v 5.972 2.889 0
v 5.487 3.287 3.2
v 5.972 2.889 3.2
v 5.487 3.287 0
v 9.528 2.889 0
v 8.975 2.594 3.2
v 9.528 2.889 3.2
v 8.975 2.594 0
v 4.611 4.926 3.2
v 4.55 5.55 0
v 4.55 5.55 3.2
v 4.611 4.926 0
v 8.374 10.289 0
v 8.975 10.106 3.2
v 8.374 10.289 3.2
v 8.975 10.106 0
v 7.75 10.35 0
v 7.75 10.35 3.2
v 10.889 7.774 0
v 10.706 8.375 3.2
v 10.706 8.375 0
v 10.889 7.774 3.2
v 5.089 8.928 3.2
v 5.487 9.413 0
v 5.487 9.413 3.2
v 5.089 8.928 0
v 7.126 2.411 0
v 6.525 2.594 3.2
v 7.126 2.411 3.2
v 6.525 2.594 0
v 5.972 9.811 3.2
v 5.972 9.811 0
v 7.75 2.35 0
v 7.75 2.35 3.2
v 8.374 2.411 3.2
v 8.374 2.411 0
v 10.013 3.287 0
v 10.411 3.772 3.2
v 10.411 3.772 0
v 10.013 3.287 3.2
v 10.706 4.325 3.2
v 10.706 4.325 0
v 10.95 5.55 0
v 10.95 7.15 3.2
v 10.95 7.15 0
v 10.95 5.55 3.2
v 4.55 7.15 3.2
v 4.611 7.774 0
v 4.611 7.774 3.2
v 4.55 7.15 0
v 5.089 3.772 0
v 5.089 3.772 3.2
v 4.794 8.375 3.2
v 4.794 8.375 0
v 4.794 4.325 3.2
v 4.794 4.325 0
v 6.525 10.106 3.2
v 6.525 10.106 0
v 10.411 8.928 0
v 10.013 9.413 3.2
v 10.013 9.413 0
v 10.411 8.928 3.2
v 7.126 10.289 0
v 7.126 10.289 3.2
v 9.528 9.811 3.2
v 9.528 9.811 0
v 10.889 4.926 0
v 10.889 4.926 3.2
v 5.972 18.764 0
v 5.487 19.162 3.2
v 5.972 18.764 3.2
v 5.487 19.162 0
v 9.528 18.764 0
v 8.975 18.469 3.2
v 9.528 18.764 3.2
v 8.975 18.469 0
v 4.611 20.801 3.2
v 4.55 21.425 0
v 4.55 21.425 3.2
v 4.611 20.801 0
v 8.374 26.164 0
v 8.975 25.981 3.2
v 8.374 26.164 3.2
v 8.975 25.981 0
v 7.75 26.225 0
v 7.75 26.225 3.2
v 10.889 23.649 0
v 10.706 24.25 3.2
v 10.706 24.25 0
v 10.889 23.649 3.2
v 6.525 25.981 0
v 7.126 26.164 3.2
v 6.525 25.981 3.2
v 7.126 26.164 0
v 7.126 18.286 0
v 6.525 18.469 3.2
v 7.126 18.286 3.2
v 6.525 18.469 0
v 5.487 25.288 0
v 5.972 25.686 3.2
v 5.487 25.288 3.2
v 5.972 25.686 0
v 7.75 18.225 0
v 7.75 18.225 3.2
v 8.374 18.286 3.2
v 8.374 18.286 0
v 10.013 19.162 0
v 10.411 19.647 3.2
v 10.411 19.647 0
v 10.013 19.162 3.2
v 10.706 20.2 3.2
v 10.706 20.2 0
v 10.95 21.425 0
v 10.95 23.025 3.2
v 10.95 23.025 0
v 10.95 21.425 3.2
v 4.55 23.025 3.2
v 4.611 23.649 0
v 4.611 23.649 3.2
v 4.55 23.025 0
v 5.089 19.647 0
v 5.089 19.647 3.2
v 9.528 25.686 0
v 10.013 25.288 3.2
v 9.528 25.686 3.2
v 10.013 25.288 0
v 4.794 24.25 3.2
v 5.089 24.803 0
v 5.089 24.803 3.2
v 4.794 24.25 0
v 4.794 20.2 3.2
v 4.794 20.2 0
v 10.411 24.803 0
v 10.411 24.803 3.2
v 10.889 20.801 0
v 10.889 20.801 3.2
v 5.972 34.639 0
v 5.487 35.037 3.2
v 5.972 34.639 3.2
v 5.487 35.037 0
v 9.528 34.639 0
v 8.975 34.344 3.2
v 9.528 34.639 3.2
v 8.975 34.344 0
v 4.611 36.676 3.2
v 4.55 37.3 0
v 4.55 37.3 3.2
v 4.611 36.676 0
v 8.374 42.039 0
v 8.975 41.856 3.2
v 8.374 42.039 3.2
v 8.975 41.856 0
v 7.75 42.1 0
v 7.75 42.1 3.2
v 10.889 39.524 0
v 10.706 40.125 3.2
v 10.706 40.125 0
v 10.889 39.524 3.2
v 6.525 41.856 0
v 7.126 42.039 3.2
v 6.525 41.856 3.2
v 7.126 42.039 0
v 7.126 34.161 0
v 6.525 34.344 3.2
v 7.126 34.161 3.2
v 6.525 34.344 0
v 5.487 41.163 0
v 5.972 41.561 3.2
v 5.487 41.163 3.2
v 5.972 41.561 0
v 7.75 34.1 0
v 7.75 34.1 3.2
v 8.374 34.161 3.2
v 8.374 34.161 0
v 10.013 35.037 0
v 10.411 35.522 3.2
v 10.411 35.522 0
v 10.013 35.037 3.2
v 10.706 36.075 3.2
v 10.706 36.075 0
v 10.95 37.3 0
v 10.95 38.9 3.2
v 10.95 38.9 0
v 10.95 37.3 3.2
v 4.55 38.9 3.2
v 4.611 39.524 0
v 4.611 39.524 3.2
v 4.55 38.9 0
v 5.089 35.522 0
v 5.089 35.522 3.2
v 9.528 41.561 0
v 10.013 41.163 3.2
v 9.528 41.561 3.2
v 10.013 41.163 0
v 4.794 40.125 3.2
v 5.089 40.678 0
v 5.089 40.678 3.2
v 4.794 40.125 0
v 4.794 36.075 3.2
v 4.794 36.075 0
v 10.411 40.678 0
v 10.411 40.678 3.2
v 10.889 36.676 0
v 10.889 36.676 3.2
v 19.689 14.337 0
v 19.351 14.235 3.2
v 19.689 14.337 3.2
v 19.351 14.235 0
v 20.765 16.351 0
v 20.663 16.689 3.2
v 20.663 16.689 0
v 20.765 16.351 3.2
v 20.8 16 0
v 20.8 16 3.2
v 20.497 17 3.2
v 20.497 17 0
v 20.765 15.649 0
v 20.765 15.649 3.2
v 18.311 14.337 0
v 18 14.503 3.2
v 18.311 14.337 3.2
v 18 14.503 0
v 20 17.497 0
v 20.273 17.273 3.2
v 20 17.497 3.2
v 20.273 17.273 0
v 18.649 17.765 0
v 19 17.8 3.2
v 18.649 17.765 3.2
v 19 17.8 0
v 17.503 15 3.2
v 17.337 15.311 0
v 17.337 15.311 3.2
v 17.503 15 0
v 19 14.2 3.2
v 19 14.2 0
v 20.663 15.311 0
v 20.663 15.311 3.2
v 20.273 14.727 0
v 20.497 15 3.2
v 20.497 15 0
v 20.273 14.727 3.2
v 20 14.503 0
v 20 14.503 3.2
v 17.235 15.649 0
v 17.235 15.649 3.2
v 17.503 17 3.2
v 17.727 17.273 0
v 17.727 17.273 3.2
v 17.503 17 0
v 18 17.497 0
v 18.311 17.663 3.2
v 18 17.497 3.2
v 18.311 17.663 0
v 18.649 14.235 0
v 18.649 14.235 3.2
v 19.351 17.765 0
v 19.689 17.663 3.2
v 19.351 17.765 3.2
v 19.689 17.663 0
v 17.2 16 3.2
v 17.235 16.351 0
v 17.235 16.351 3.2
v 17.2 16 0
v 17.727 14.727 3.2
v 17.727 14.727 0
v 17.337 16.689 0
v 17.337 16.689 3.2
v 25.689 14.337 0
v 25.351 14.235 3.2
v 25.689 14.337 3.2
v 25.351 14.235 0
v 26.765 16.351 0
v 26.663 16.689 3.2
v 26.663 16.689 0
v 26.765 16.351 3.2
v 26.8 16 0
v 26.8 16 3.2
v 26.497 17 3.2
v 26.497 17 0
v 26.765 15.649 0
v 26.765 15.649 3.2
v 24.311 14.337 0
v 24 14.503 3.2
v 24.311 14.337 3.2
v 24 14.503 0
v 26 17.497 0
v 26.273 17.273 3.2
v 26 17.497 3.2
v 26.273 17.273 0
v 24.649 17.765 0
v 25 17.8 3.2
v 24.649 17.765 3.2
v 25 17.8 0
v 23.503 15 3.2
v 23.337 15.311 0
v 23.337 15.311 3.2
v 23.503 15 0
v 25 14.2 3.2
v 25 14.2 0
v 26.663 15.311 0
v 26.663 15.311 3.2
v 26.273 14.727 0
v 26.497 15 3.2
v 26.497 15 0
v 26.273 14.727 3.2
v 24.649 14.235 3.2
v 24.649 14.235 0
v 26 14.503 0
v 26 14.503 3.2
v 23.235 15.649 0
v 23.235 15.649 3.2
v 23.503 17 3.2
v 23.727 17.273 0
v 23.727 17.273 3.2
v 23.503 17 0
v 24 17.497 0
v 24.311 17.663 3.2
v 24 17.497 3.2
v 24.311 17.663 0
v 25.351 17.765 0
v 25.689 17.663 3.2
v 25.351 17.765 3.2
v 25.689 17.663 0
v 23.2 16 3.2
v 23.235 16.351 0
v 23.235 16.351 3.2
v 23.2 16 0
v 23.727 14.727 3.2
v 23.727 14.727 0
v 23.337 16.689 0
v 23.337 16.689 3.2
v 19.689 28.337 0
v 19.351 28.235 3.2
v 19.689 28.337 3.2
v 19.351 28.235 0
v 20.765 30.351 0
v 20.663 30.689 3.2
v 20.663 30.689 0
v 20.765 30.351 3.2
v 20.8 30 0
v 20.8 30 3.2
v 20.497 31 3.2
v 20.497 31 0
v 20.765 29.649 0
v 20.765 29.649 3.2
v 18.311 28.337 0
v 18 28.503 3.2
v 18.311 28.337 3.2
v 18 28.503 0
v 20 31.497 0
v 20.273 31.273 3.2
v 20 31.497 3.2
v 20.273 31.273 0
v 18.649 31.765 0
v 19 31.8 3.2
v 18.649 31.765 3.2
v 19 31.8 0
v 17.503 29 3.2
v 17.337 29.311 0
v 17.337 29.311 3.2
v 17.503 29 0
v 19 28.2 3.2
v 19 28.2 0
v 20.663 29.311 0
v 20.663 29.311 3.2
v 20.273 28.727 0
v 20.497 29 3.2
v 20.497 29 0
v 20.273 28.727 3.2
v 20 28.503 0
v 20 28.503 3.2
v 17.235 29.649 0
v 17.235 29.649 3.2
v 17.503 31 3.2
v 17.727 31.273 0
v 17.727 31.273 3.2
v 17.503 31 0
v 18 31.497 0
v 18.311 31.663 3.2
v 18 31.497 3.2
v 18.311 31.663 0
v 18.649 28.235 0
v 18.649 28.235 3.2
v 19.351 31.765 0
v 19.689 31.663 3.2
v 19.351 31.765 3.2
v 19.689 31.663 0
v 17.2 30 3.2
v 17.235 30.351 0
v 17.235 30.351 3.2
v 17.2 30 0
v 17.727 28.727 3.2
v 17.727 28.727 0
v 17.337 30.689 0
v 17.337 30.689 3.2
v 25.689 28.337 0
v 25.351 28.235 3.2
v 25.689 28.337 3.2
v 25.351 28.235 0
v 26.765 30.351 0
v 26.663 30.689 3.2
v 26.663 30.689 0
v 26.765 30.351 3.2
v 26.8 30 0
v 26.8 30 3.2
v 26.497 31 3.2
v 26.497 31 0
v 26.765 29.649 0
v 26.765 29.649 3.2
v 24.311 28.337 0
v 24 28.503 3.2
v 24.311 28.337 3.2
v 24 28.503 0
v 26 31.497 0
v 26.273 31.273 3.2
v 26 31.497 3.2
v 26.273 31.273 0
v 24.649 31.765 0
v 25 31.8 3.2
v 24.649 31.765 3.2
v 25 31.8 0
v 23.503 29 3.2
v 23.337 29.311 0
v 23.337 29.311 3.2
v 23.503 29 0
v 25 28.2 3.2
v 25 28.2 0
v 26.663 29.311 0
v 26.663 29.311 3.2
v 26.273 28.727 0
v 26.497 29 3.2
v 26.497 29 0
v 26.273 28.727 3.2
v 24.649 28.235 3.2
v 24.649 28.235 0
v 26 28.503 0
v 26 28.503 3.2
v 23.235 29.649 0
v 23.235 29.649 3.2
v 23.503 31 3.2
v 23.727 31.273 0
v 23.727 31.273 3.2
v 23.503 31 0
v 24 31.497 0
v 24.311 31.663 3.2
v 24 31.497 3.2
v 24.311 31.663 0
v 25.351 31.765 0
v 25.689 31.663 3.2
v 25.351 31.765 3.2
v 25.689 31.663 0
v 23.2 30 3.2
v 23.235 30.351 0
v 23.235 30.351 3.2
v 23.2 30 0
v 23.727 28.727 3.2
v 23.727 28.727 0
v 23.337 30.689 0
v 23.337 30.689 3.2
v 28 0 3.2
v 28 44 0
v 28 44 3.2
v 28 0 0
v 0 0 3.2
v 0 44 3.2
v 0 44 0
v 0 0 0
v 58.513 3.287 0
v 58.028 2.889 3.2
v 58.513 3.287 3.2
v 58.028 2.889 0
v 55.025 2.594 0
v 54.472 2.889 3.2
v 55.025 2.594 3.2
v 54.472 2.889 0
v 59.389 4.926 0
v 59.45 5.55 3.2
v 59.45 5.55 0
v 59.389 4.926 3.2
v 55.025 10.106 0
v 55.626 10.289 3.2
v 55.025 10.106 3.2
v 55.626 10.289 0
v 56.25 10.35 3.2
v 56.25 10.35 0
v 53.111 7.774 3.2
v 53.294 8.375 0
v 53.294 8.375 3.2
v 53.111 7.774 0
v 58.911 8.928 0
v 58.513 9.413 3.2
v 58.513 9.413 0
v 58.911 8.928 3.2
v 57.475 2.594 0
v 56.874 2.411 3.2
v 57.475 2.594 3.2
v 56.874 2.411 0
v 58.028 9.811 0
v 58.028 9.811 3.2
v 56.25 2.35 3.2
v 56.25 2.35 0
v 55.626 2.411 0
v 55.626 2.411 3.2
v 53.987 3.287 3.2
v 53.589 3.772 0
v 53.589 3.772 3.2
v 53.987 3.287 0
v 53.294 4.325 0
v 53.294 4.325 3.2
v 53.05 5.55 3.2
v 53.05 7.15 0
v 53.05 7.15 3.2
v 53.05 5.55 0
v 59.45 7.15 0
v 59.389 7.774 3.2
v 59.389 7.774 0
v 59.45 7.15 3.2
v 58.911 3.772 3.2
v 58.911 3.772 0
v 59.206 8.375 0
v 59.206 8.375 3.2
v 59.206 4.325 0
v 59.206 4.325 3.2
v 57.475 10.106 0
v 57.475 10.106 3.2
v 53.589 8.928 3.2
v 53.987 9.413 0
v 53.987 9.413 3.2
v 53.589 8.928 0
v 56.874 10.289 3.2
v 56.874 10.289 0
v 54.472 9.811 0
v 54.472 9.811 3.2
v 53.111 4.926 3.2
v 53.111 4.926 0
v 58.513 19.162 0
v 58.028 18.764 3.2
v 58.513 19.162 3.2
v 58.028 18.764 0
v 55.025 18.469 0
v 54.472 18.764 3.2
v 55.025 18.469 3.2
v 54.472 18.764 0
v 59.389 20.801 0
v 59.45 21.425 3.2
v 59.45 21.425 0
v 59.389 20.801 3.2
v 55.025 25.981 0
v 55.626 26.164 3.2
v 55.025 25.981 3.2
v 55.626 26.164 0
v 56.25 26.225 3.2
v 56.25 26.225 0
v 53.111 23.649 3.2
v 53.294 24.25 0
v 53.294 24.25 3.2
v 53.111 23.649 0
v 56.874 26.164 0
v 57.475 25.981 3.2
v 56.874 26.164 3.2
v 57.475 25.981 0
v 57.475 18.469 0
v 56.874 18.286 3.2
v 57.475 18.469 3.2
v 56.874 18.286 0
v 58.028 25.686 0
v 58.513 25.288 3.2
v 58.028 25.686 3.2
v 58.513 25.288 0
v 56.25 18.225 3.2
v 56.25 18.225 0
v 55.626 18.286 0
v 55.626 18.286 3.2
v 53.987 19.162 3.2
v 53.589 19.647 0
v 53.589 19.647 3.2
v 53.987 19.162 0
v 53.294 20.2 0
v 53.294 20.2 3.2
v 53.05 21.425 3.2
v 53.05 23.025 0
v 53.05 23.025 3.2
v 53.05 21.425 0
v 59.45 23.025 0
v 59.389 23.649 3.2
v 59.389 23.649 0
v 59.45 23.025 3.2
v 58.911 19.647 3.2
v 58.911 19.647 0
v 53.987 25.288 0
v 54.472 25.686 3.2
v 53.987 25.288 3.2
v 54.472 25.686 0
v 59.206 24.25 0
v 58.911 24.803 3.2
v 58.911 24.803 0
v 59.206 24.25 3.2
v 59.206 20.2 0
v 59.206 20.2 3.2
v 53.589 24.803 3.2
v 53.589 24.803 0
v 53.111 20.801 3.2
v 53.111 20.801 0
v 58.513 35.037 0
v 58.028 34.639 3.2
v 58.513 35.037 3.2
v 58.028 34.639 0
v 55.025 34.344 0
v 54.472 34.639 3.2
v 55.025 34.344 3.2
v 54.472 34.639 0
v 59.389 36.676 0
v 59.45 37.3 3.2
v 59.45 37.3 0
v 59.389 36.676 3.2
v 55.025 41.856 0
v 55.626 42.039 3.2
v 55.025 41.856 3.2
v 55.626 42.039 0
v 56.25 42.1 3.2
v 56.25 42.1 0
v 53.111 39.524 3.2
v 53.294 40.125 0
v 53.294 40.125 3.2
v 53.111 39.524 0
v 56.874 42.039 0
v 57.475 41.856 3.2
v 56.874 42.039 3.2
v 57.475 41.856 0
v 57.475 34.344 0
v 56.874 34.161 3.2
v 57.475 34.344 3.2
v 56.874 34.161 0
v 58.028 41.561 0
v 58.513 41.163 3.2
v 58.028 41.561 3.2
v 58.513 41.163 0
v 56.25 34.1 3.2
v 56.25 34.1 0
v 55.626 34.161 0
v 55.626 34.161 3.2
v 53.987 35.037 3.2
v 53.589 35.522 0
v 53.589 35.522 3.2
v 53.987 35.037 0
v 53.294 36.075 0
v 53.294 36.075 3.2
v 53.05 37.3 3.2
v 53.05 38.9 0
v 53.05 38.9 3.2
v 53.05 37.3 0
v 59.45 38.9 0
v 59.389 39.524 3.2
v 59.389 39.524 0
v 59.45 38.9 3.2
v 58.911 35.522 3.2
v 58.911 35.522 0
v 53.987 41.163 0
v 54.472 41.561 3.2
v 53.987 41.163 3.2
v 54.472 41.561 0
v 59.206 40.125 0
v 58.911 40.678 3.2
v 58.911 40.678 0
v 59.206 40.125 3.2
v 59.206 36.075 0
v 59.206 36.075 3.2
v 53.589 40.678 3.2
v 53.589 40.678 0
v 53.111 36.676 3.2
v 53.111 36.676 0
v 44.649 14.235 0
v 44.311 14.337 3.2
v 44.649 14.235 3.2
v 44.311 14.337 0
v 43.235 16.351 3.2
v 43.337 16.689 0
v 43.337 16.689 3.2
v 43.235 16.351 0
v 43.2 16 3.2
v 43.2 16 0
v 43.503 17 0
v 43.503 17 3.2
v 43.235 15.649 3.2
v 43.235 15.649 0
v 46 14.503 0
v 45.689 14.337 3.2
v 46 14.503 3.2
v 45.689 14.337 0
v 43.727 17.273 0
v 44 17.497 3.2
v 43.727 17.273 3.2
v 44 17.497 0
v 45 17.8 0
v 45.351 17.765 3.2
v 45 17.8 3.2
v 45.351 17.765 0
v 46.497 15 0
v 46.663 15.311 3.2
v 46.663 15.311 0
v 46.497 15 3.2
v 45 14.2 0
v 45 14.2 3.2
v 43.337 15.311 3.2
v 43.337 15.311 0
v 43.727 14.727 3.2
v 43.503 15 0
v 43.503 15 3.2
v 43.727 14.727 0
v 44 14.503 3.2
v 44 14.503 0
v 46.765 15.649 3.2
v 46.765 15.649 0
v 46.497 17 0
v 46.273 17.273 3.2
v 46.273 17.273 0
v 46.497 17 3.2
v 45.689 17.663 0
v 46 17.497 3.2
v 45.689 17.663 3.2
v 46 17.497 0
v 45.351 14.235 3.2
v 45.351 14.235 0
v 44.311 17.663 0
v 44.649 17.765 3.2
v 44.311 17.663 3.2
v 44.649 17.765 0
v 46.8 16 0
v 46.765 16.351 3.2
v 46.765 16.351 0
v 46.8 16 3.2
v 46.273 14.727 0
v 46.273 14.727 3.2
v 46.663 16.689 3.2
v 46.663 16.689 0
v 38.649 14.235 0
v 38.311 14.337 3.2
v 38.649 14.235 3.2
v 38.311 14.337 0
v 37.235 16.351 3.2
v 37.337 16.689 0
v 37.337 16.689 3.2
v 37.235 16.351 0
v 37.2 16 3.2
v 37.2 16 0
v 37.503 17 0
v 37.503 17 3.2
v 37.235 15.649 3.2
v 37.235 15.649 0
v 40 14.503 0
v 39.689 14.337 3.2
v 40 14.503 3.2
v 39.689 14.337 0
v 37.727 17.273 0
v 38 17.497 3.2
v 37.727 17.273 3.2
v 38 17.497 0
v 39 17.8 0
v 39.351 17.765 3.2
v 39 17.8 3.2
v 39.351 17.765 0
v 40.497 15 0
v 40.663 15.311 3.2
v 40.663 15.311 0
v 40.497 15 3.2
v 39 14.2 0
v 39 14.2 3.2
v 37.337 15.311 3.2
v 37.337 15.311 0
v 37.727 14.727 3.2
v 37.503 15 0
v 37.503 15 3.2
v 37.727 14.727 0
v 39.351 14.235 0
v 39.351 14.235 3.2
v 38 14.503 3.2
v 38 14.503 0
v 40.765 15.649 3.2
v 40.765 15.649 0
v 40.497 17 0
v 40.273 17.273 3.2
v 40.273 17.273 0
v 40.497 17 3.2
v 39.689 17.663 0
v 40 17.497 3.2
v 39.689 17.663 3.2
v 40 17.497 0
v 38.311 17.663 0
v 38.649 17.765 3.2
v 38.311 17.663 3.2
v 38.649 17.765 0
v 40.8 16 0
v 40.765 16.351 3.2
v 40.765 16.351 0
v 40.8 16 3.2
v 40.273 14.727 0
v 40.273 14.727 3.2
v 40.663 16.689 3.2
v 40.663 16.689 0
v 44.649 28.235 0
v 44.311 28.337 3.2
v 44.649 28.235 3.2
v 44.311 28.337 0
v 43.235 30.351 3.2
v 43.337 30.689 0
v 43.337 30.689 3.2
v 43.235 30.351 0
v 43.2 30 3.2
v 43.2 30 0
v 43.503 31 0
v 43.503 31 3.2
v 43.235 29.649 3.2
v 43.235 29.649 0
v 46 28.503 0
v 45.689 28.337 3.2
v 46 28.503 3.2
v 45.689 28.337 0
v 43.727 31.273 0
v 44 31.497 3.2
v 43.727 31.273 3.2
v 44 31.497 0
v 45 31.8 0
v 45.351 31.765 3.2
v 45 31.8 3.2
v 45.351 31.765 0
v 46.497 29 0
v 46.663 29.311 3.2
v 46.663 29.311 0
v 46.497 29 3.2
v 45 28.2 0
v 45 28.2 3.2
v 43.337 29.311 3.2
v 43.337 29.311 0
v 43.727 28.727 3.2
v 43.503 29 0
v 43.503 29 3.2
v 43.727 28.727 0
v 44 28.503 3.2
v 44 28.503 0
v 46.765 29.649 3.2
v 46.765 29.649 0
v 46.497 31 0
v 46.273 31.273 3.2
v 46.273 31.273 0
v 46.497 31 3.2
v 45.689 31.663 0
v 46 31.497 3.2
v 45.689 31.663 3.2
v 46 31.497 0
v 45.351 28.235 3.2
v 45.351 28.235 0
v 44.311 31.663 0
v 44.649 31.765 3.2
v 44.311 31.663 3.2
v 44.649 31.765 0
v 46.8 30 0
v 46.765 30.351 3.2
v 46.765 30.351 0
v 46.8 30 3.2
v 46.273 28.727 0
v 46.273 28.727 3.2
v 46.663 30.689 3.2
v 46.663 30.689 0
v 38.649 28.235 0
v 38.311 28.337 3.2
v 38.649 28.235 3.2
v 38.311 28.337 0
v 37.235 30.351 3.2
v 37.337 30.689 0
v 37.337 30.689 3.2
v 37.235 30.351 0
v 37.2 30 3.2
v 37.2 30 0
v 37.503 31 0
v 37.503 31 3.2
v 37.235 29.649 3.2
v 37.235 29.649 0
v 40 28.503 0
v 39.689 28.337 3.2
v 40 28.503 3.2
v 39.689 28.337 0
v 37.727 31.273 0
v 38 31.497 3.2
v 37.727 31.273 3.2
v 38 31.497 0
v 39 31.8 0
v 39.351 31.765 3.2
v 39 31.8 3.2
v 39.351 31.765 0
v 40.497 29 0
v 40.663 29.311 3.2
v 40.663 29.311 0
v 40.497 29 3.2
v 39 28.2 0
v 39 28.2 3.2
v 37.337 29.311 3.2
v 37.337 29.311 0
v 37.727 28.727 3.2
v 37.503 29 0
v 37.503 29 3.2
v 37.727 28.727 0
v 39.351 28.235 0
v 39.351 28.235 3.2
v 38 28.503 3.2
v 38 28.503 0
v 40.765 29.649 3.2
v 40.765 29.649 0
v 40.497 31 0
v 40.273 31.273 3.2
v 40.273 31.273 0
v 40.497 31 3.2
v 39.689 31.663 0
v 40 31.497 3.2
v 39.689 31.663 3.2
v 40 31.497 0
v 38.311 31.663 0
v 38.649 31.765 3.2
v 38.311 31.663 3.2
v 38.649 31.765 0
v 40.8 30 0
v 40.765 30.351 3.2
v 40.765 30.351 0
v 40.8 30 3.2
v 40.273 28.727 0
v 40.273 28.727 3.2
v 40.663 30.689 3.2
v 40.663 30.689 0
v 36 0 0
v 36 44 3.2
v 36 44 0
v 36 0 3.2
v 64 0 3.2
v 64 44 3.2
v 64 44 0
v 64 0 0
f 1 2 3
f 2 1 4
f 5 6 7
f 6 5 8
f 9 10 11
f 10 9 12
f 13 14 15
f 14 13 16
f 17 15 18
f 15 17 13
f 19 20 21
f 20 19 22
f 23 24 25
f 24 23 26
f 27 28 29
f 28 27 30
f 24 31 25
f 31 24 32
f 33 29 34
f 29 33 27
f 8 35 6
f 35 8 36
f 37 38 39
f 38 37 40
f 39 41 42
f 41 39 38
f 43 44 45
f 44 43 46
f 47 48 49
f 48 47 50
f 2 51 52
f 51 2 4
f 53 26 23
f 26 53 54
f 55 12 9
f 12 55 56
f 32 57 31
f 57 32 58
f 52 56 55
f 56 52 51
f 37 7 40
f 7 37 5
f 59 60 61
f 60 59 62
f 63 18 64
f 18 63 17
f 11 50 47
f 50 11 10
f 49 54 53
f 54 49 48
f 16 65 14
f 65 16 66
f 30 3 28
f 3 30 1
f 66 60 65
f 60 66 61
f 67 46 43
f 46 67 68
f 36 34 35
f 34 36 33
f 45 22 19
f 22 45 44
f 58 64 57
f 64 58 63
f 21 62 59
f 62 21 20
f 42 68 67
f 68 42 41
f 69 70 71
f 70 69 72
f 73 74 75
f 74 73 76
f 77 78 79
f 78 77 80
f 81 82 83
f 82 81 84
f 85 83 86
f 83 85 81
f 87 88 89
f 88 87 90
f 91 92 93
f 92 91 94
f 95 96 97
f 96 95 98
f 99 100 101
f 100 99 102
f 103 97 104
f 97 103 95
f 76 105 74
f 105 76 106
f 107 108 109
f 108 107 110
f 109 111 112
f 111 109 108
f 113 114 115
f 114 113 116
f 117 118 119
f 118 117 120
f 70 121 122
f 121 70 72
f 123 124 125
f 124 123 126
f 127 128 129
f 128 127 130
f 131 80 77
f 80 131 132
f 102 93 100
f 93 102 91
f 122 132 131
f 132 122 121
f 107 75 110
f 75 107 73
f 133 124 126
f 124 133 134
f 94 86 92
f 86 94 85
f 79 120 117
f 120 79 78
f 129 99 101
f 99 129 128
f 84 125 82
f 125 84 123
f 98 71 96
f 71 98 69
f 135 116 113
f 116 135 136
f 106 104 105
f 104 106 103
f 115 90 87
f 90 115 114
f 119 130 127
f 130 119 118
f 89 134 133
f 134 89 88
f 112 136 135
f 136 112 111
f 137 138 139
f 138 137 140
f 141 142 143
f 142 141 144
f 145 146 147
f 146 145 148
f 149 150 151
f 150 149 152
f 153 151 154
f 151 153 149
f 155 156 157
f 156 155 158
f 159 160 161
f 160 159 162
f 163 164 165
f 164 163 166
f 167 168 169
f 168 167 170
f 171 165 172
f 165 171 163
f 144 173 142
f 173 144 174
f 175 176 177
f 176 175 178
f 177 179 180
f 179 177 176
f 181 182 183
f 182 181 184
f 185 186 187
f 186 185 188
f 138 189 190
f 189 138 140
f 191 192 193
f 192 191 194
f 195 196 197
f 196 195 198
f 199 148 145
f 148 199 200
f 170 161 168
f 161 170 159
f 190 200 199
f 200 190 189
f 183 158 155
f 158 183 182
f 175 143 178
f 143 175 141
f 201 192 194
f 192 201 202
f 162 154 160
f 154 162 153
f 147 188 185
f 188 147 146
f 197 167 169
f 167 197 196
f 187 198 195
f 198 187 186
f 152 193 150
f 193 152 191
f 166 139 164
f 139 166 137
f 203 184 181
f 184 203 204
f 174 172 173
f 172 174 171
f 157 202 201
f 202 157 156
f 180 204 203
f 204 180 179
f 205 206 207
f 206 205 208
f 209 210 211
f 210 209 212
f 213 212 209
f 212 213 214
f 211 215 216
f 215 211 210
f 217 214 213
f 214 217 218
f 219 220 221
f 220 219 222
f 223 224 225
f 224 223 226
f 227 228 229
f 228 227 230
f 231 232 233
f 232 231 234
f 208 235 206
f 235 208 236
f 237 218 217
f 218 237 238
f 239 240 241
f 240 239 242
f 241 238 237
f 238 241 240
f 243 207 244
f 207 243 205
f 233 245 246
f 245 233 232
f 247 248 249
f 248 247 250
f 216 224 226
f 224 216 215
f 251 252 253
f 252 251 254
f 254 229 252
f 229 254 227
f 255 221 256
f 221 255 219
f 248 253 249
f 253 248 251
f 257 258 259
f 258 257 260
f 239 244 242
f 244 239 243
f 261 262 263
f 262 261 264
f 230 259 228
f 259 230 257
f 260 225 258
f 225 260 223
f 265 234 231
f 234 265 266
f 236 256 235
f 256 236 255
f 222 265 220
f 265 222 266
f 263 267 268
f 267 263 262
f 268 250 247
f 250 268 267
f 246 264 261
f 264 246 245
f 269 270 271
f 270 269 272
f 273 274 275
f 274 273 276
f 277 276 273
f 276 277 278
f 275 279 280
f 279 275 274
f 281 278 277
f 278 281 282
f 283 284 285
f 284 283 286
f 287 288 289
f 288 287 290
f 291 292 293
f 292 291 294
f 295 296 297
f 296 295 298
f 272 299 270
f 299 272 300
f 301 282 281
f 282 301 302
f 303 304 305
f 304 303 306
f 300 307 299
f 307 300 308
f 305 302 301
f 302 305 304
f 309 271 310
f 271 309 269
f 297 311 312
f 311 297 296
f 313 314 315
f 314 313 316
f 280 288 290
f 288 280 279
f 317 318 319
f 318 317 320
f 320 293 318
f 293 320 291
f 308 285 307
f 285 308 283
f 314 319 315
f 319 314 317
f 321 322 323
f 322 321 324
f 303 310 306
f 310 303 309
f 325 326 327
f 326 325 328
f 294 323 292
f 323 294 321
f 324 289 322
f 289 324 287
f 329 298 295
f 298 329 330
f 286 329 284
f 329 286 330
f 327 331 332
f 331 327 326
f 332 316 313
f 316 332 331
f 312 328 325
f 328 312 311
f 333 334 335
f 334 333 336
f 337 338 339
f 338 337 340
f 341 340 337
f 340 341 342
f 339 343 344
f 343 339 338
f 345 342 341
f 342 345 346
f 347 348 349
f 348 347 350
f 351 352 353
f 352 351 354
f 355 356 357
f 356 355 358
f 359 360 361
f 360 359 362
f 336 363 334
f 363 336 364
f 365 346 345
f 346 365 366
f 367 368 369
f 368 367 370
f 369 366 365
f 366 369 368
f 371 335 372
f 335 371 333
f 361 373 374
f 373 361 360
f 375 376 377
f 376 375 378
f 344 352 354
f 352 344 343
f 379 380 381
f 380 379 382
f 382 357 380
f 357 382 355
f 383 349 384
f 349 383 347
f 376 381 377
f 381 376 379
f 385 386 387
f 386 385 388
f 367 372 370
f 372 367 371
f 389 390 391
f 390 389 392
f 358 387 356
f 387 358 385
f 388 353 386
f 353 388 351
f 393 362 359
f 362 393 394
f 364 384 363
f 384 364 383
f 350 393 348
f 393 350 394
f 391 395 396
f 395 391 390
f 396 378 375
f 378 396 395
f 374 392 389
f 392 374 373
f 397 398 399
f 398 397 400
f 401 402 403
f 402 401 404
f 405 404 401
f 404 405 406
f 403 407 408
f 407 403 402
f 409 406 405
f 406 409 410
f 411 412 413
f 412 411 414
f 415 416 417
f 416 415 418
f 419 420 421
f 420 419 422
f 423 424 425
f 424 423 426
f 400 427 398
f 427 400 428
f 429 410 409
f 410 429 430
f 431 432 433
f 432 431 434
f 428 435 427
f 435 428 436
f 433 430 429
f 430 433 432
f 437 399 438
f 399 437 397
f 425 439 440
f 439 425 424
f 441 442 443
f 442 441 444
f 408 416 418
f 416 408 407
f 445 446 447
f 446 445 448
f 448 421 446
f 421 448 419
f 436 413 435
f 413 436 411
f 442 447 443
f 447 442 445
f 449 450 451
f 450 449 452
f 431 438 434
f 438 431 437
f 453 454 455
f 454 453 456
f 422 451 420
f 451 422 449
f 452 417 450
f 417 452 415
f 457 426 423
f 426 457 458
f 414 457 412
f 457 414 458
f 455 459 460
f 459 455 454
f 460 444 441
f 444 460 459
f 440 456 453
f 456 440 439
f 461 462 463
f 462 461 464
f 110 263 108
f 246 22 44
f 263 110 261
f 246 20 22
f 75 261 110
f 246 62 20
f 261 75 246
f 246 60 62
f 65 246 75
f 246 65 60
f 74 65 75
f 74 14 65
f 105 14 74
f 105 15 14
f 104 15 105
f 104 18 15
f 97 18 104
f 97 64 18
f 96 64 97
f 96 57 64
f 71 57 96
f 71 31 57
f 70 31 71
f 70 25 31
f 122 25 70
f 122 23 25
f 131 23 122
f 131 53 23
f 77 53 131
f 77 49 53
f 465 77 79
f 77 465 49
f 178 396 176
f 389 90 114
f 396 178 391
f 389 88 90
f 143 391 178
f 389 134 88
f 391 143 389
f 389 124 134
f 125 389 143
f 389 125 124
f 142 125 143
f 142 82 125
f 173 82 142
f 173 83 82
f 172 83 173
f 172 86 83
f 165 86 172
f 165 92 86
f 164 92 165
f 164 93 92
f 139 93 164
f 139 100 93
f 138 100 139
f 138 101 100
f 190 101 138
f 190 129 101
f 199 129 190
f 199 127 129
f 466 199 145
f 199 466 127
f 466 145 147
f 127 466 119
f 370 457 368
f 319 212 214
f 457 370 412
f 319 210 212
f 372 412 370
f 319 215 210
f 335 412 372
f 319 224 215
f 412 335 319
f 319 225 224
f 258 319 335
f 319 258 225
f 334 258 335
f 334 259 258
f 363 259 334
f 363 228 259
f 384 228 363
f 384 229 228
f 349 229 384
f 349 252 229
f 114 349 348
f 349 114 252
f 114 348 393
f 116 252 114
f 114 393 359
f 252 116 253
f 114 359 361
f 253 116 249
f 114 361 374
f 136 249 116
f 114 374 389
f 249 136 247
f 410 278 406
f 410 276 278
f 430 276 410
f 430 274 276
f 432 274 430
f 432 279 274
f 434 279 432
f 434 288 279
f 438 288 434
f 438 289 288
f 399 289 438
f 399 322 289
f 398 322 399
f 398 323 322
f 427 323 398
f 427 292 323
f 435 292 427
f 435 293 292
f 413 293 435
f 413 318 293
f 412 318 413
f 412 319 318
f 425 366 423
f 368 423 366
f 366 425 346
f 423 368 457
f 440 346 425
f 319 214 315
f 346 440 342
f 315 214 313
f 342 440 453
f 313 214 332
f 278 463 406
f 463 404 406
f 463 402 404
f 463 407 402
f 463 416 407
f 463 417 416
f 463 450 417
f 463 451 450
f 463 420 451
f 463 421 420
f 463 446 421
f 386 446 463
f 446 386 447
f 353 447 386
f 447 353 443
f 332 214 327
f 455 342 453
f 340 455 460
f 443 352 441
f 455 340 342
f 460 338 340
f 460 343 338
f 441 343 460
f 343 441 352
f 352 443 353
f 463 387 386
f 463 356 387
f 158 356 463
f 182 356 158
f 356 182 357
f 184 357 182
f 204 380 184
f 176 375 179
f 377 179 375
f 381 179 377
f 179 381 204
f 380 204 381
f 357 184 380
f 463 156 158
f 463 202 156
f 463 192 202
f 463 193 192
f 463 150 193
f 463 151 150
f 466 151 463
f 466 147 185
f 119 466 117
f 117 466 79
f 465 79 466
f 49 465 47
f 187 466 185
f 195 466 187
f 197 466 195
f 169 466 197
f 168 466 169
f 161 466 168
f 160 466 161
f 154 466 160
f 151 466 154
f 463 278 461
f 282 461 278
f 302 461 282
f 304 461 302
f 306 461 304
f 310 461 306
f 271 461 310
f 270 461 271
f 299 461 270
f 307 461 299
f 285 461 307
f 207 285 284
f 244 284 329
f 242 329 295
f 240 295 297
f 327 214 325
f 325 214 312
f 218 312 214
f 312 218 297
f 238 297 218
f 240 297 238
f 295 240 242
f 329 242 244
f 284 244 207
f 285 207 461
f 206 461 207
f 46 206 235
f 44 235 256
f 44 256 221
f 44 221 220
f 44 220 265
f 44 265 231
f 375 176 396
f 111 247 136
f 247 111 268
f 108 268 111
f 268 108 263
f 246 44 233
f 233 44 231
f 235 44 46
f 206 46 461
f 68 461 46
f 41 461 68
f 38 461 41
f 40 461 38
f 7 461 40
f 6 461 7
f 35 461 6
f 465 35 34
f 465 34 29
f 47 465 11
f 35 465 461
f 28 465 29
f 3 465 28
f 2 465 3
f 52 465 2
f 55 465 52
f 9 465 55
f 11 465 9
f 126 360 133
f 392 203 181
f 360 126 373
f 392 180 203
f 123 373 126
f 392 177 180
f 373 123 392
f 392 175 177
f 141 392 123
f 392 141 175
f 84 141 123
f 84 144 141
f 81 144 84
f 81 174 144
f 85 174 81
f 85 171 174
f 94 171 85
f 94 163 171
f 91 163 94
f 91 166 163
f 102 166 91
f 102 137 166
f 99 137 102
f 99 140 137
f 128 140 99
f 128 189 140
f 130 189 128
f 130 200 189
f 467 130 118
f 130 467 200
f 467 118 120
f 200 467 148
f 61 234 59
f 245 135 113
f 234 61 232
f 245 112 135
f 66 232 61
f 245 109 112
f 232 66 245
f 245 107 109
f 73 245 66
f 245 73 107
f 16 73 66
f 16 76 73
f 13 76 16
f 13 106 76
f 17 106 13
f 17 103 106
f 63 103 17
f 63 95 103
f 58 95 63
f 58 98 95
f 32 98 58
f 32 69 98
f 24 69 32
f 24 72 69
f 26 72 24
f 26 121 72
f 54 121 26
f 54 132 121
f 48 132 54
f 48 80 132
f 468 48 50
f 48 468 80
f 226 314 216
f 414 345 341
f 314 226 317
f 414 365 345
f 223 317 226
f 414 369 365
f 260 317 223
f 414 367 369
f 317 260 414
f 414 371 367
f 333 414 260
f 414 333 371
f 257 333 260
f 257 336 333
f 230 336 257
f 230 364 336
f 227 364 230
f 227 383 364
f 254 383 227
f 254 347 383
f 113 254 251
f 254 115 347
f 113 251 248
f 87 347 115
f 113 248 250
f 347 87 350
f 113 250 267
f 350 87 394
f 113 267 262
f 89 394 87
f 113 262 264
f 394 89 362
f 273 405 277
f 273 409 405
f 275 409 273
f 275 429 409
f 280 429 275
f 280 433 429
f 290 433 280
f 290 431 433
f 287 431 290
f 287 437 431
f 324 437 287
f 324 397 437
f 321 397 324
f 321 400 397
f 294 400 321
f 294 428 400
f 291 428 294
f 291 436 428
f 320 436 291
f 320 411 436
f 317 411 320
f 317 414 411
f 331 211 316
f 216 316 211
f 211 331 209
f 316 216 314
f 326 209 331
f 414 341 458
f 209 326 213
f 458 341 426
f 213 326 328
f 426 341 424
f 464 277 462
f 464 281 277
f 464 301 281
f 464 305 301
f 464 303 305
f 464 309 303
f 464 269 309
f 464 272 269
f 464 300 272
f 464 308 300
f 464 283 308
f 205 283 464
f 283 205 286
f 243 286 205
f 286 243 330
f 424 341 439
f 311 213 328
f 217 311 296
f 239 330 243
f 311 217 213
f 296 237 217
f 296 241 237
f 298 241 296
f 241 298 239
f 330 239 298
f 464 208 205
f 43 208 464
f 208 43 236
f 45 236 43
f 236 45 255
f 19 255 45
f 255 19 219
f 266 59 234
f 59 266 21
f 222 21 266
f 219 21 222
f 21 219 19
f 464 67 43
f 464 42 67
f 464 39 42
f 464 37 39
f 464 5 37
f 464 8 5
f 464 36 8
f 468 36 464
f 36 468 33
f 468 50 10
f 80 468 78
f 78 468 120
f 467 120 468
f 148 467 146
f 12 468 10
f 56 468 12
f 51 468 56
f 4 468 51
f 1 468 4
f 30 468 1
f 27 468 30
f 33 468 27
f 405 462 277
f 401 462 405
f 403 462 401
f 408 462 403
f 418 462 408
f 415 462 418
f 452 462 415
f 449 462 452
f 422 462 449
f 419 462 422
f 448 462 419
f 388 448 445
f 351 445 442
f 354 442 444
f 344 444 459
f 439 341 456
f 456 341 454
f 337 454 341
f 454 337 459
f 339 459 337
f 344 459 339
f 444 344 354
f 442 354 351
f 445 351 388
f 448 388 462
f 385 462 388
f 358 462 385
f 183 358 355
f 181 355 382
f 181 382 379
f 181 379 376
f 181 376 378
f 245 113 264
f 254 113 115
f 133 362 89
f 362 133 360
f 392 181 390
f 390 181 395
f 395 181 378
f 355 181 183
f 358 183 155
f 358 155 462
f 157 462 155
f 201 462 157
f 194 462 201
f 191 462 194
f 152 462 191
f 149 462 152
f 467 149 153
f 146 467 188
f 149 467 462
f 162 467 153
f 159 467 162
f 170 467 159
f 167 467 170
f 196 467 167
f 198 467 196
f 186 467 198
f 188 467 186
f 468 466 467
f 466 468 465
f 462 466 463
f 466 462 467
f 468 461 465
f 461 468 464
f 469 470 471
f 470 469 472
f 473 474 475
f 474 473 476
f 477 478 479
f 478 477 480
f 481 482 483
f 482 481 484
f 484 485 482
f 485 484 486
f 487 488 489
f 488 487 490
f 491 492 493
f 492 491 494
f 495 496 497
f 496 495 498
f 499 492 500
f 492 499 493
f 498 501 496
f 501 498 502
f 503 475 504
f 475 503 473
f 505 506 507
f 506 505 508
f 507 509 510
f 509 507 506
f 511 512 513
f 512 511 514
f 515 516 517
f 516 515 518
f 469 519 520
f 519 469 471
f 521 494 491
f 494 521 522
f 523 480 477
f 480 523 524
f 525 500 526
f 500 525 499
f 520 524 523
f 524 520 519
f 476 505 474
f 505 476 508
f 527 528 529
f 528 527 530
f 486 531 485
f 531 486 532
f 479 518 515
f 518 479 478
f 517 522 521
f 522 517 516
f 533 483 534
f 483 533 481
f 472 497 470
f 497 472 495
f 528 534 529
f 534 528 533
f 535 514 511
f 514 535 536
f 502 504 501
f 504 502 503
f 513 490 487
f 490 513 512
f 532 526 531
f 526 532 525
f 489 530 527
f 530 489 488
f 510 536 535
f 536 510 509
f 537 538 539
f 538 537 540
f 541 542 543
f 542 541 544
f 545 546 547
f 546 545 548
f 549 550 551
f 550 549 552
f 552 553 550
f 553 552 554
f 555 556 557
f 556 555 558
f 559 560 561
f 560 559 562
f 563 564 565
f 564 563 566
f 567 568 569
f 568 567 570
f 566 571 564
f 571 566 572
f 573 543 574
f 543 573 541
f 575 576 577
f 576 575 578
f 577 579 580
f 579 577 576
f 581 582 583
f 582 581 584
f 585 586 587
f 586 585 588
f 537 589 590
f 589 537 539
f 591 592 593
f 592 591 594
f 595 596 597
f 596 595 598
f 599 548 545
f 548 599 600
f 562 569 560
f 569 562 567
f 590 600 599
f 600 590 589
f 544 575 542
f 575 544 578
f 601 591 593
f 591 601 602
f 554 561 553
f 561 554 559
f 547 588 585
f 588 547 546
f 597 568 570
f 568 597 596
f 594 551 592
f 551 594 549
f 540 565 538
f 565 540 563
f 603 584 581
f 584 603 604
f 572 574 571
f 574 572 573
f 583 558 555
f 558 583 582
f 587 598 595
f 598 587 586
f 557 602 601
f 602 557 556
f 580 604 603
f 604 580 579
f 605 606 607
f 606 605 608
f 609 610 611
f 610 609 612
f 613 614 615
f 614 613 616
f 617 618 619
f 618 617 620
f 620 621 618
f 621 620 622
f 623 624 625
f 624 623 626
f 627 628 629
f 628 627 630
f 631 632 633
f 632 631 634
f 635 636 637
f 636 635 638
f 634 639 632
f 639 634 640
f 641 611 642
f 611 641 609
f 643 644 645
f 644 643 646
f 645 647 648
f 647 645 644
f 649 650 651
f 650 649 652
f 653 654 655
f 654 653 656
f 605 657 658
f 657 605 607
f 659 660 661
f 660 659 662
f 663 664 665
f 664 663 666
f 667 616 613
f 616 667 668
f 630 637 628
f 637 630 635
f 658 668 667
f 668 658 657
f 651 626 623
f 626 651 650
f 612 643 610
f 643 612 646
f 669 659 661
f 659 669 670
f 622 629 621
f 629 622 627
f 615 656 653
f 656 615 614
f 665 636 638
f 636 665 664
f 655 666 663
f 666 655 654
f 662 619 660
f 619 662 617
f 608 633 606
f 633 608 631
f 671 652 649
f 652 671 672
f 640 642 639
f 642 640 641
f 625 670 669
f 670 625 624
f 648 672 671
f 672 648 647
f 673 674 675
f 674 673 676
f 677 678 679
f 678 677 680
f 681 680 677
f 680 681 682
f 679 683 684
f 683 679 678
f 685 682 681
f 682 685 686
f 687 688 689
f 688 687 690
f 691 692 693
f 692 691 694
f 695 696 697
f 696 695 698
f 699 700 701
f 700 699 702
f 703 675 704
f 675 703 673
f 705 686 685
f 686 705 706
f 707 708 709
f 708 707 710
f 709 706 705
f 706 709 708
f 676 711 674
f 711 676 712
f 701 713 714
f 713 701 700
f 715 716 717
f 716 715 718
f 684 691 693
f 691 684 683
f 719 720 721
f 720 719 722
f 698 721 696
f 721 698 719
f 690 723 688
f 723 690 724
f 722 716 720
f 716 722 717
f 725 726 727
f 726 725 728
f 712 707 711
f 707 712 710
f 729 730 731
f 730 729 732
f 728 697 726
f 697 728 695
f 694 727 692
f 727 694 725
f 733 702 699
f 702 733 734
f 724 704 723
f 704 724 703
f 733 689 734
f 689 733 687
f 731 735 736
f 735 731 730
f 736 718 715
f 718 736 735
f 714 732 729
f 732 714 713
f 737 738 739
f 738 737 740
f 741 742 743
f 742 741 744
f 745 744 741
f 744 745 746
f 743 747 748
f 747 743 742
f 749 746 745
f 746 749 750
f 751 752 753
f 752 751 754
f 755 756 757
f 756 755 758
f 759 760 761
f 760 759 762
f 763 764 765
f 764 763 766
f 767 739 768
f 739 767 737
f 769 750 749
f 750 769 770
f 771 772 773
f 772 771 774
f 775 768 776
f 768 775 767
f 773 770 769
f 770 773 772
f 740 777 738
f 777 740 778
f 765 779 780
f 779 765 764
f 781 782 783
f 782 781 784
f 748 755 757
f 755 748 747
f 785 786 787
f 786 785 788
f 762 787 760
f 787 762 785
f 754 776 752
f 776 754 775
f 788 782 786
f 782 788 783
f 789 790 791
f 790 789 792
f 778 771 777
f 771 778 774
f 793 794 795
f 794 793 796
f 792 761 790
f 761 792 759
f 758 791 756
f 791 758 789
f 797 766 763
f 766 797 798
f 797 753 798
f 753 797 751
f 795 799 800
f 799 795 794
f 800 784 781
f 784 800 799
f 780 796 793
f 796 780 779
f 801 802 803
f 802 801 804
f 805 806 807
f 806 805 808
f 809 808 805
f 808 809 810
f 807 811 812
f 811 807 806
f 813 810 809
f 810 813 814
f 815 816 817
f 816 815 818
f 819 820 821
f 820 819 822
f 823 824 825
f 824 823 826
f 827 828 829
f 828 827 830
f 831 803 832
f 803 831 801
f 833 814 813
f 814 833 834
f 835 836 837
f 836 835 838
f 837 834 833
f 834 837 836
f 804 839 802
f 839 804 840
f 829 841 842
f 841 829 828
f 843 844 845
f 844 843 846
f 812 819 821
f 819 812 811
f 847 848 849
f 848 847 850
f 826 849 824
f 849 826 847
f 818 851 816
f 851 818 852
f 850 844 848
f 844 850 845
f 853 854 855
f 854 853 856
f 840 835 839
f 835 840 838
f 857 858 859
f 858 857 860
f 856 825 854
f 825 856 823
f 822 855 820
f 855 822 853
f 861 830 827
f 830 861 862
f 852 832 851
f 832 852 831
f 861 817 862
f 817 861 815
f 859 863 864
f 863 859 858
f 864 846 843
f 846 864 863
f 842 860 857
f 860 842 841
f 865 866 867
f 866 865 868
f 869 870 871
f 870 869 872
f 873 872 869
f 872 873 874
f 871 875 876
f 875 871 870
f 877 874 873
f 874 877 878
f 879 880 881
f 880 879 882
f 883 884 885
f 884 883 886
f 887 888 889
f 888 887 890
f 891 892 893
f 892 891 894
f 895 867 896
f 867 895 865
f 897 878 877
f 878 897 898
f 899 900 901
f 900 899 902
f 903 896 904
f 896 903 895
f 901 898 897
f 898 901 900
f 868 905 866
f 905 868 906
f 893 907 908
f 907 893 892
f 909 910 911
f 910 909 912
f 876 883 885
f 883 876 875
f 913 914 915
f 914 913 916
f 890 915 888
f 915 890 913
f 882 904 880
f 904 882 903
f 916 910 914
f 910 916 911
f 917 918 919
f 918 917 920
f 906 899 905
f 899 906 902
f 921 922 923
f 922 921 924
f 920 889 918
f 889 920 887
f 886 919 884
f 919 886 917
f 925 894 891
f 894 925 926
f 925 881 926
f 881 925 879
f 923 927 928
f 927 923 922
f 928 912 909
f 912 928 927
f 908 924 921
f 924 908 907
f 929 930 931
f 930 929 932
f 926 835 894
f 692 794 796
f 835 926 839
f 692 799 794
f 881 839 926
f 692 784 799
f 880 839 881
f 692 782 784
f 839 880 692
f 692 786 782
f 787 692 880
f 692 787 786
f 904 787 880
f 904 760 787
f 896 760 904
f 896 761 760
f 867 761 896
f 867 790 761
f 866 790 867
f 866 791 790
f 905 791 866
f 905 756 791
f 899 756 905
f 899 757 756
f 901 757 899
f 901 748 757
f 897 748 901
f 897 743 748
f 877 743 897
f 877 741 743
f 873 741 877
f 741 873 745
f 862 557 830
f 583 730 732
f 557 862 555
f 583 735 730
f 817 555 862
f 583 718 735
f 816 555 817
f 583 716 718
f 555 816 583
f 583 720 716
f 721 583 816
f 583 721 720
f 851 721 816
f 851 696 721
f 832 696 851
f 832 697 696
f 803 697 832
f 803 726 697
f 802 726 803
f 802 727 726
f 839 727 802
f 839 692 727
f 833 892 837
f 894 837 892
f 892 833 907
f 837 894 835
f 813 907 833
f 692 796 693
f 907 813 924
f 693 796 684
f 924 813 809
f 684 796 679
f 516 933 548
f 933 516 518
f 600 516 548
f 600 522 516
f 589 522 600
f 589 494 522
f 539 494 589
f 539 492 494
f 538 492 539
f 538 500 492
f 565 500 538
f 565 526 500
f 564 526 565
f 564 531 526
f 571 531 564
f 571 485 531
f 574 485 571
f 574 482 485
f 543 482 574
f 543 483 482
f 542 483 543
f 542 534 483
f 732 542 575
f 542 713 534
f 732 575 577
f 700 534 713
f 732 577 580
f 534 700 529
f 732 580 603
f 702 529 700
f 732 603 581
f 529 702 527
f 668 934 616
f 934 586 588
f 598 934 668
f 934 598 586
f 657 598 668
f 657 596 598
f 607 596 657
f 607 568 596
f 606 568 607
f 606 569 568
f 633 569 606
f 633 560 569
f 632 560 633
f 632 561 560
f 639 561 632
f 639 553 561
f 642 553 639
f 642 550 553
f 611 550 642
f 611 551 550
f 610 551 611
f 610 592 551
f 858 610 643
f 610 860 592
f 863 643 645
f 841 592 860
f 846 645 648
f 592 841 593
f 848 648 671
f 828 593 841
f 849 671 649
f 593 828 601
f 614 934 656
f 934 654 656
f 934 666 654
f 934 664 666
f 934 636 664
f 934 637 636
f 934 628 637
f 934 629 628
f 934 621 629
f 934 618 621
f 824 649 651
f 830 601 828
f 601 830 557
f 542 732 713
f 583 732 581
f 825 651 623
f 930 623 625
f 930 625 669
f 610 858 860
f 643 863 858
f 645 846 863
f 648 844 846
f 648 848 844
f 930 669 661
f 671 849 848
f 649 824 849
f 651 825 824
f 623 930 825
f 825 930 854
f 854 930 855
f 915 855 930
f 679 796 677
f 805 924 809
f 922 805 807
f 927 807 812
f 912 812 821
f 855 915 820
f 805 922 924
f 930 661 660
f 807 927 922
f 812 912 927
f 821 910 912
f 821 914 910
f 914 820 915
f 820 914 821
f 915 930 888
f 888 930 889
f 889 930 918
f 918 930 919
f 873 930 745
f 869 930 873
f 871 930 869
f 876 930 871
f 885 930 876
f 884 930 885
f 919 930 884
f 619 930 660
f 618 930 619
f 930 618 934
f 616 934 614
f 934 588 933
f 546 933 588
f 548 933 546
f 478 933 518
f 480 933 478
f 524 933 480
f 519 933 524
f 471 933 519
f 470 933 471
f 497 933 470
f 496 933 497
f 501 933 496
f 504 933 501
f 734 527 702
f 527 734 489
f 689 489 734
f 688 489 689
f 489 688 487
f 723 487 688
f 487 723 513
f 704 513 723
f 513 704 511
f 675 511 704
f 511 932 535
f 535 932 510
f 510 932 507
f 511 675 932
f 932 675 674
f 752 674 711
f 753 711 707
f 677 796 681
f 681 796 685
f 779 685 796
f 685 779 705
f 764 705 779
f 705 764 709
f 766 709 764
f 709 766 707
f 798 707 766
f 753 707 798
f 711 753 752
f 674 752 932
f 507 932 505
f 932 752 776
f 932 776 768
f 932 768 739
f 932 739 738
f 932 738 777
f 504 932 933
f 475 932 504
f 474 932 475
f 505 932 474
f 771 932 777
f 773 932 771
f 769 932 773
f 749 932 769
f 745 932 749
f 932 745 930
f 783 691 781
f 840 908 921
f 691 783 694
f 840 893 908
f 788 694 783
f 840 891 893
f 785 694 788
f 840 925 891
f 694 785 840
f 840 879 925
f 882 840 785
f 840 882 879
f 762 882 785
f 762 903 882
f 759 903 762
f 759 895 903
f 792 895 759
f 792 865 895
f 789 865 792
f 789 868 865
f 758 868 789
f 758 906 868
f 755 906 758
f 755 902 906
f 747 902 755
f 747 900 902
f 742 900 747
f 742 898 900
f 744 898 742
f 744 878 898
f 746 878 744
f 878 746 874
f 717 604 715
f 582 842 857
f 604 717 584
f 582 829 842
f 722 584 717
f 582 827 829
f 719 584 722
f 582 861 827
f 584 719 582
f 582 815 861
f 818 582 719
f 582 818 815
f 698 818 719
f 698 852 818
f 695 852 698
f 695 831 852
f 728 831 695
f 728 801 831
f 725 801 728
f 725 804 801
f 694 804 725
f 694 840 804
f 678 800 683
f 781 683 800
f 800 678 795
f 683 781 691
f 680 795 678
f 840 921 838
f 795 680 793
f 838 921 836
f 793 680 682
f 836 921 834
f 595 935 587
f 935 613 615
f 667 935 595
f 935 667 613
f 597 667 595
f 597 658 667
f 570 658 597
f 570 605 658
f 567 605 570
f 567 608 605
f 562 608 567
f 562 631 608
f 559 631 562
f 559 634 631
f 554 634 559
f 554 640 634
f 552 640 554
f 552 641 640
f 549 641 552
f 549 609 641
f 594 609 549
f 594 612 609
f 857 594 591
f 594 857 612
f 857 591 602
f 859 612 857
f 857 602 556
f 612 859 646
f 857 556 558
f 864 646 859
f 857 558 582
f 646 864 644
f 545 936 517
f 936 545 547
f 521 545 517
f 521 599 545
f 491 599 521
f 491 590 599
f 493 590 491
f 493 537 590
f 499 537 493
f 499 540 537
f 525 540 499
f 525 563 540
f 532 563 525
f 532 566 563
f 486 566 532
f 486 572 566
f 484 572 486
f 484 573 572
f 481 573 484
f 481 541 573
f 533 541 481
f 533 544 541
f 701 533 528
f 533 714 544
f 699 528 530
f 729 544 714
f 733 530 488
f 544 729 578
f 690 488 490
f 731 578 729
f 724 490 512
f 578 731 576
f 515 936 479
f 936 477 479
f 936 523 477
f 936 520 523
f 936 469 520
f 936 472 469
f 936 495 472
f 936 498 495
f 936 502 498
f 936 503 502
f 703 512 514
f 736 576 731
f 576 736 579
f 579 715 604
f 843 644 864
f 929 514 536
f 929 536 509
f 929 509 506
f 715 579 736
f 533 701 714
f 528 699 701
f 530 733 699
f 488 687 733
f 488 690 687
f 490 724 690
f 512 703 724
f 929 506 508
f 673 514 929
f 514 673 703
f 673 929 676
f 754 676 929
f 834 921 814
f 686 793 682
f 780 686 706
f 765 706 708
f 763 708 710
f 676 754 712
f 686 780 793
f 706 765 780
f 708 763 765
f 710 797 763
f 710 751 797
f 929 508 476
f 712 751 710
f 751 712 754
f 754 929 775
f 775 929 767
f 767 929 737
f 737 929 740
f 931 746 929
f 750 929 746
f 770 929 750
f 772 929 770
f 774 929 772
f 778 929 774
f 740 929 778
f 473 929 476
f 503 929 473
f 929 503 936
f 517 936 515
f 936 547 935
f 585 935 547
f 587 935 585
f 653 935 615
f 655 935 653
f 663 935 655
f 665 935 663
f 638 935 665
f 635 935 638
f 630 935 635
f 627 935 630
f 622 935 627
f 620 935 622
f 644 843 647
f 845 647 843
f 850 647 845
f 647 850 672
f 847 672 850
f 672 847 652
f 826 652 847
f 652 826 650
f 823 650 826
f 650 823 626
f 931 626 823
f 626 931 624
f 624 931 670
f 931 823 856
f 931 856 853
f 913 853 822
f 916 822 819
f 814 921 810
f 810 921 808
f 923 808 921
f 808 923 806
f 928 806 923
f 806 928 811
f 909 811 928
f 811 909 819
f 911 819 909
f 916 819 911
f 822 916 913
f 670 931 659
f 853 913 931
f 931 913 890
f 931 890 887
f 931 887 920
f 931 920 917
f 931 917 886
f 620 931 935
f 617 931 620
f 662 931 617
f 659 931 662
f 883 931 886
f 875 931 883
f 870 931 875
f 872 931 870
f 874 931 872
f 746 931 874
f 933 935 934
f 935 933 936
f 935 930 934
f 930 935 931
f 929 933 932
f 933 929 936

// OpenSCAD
// file: ../params.scad
// Общие размеры первой итерации: один отсек 3.5" и детали вокруг него.
// Корпус диска — SFF-8301, таблица 3-1, класс высоты 26.10 мм (максимум).
// Положение разъёма SATA сюда не зашито: его снимают калибром gauge.scad
// с конкретного диска и только потом переносят в окно салазок.

drive_width = 101.60;
drive_height = 26.10;
drive_length = 147.00;

wall = 4.0;
floor_t = 4.0;
lip_t = 3.0;
nib = 4.0;
side_clearance = 0.8;
top_clearance = 1.5;

front_gap = 3.0;
plate_t = 8.0;
front_extra = front_gap + plate_t;

pusher_d = 4.4;
m3_clear = 3.4;
m3_pilot = 2.6;
m3_nut_af = 5.5;
m3_nut_t = 2.8;

cavity_w = drive_width + side_clearance;
outer_w = cavity_w + 2 * wall;
wall_h = drive_height + top_clearance;
body_z = drive_length + front_extra;

strap_z = 18;
strap_t = 4.0;
strap_foot = 14.0;

plate_screw_x = [14, drive_width - 14];
plate_z0 = drive_length + front_gap;
plate_screw_z = plate_z0 + plate_t / 2;
plate_bar_h = 10;
tower_w = 28;
tower_x = drive_width / 2 - tower_w / 2;

sled_w = 78;
sled_h = 48;
sled_t = 8;
sled_window_w = 50;
sled_window_h = 18;
sled_hole_inset = 6;

// Каркас 1U. Шаг EIA — 44.45 мм, уголок 44.0 мм, чтобы соседний юнит не тёрся.
// Гнездо 8.4 мм принимает трубку до 8 мм. Хомут тянет её к внешней стенке гнезда.
// При rod_d = 6 между трубками 29 мм: пол корзины 1.6 мм, диск 26.1 мм, воздух ~1 мм.
// При 8 мм диск 26.1 мм в этот юнит уже не входит.
unit_h = 44.0;
rod_d = 6;
socket_d = 8.4;
// 10 мм хватает, чтобы трубка села и хомут её зажал. Столбик тогда 12 мм,
// и четыре корзины остаются внутри просвета 450 мм.
socket_depth = 10;
socket_wall = 1.6;
skin = 0.8;
foot = 1.6;
roof = 1.4;
tie_w = 3.2;
// Просвет между направляющими стойки 19 дюймов — 450 мм.
opening_w = 450;
bay_count = 4;
bay_gap = 1.0;
basket_wall = 1.6;
basket_clear = 0.6;
rail_t = 1.6;
// Торец разъёма выступает за ближнюю трубку к каретке, чтобы трубка не перекрыла SATA.
plug_overhang = 16;
stop_margin = 14;

socket_r = socket_d / 2;
post_x = socket_depth + 2;
axis_inset = skin + socket_r;
bottom_axis_y = foot + socket_r;
top_axis_y = unit_h - roof - socket_r;
depth_z0 = axis_inset + socket_r + socket_wall;
post_z = depth_z0 + socket_depth;
basket_w = drive_width + basket_clear + 2 * basket_wall;
inner_w = bay_count * basket_w + (bay_count - 1) * bay_gap;
frame_w = inner_w + 2 * post_x;
rod_span = drive_length - plug_overhang + stop_margin;
frame_depth = rod_span + 2 * axis_inset;
rod_y0 = foot + rod_d / 2;
rod_y1 = unit_h - roof - rod_d / 2;
rod_gap = (rod_y1 - rod_d / 2) - (rod_y0 + rod_d / 2);

// KW11-3Z: корпус около 19.8 x 10.2 x 6.4 мм, два отверстия 2.35–2.5 мм
// с шагом 9.5 мм под винты M2.
switch_hole_d = 2.5;
switch_pitch = 9.5;

$fn = 32;
// file: params.scad
// Наборный ярус. Стоит рядом с cad/rack.scad и ту стойку не заменяет.
// Диск, юнит, гнездо 8.4 мм и ширина четырёх отсеков — из ../params.scad.
// Здесь их не копируют: если правка там, ярус подхватит её сам.
include <../params.scad>

$fn = 32;

// Сборка на трубке 6 мм. Гнездо принимает и 8 мм, но тогда диск 26.1 мм
// в юнит 44 мм уже не входит: между трубками остаётся около 29 мм.
m4_clear = 4.4;
board_t = 1.6;
standoff_h = 6;
comp_max = 10;
tray_t = 2.4;
tie_hole = 3.6;

// Плата Pi 4: 85 × 56 мм. Отверстия Ø2.7 под M2.5, шаг 58 × 49,
// отступ 3.5 от левого края и от обеих кромок стороны 56 мм.
// Чертёж Raspberry Pi Ltd RP-008343-DS-1. В пластике проход 2.9 мм.
// https://pip-assets.raspberrypi.com/categories/545-raspberry-pi-4-model-b/documents/RP-008343-DS-1-raspberry-pi-4-mechanical-drawing.pdf
pi_l = 85;
pi_w = 56;
pi_hole_d = 2.9;
pi_pitch_x = 58;
pi_pitch_y = 49;
pi_inset = 3.5;

sata_l = 100;
sata_w = 80;
ctrl_l = 100;
ctrl_w = 100;

// Шпилька M4 не встаёт рядом с гнездом в столбике 12 мм,
// а столбик шире раздвигает каркас за просвет 450 мм.
// Поэтому колодец шпильки — в переднем блоке, гнёзда за ним по глубине.
rod_hole_x = post_x / 2;
rod_hole_z = 5;
socket_gap = 1.6;

width_axis_z = rod_hole_z + m4_clear / 2 + socket_gap + socket_r;
depth_bore_z = width_axis_z + socket_r + socket_gap;
stack_post_z = depth_bore_z + socket_depth;
depth_axis_x = post_x / 2;

// Ложемент. Его z = 0 — передний край ушка.
ear_past = rod_d / 2 + 4;
cradle_lip_t = 2.4;
cradle_cheek_t = 2.4;
cradle_cheek = 4;
cradle_gap_tube = 1.0;
cradle_rear_inset = 22;
cradle_lip_h = 8;

cradle_z_front = ear_past;
cradle_z_drive0 = cradle_z_front + rod_d / 2 + cradle_gap_tube + cradle_lip_t;
cradle_z_drive1 = cradle_z_drive0 + drive_length;
cradle_z_rear = cradle_z_drive1 - cradle_rear_inset;
cradle_z_end = cradle_z_drive1 + cradle_cheek_t;

// Передняя трубка яруса совпадает с гнездом уголка.
cradle_z0 = width_axis_z - cradle_z_front;
drive_z0 = cradle_z0 + cradle_z_drive0;
drive_z1 = cradle_z0 + cradle_z_drive1;
mid_rail_z = cradle_z0 + cradle_z_rear;
cradle_y = rod_y0 + rod_d / 2;

// Задний отсек: кабели и платы лёжа. Договор просит не меньше 90 мм.
// Контрольная плата 100 мм, поэтому между осями трубок лотка 120 мм.
cable_gap = 36;
tray_span = 120;
bay_rail_z = drive_z1 + cable_gap;
rear_width_z = bay_rail_z + tray_span;
stack_depth = rear_width_z + width_axis_z;
tray_len = tray_span + 2 * ear_past;
tray_z0 = bay_rail_z - ear_past;

width_tube_len = frame_w - 2 * (post_x - socket_depth);
depth_tube_len = stack_depth - 2 * depth_bore_z;
rail_end_gap = 0.4;
rail_x0 = depth_axis_x + rod_d / 2 + rail_end_gap;
cross_tube_len = frame_w - 2 * rail_x0;

// Хомут рельса. Оси локальные, сборка совмещает их с трубками.
clamp_dx = 10;
clamp_cz = 12;

stud_extra = 16;
ear_out = 16;
ear_t = 3.2;

sata_tray_w = sata_l + 16;
ctrl_tray_w = ctrl_l + 16;
pi_tray_w = pi_l + 16;

bay_clear = (rear_width_z - rod_d / 2) - drive_z1;
board_stack = tray_t + standoff_h + board_t + comp_max;
// main file
// Ухо стойки на один юнит. Плашмя, фланец на стол.
// Пазы под винт M6 сидят на шаге EIA-310: 6.35, 22.225 и 38.1 мм от низа юнита.
// Ярус 44.0 мм короче шага 44.45, поэтому паз, а не круглое отверстие.
// В STL левое и правое. Для 2U и 3U: openscad -D ear_u=2 или два уха друг на друга.
// Тело яруса остаётся внутри просвета 450 мм. Ухо торчит вперёд, на планку стойки.
include <params.scad>

module ear_slot() {
    d = 6.4;
    span = 8;
    hull() {
        translate([0, -(span - d) / 2, 0])
            cylinder(h = ear_t + 2, d = d);
        translate([0, (span - d) / 2, 0])
            cylinder(h = ear_t + 2, d = d);
    }
}

module rack_ear(u = 1) {
    h = u * unit_h;
    w = ear_out + post_x;
    slot_x = ear_out - 8.25;

    difference() {
        cube([w, h, ear_t]);

        for (i = [0 : u - 1], dy = [6.35, 22.225, 38.1])
            translate([slot_x, i * 44.45 + dy, -1])
                ear_slot();

        for (i = [0 : u - 1], yy = [16, 30], xx = [3, post_x - 3])
            translate([ear_out + xx, i * unit_h + yy, -1])
                cylinder(h = ear_t + 2, d = tie_hole);
    }
}

u_print = is_undef(ear_u) ? 1 : ear_u;
rack_ear(u_print);
translate([2 * (ear_out + post_x) + 8, 0, 0])
    mirror([1, 0, 0])
        rack_ear(u_print);
